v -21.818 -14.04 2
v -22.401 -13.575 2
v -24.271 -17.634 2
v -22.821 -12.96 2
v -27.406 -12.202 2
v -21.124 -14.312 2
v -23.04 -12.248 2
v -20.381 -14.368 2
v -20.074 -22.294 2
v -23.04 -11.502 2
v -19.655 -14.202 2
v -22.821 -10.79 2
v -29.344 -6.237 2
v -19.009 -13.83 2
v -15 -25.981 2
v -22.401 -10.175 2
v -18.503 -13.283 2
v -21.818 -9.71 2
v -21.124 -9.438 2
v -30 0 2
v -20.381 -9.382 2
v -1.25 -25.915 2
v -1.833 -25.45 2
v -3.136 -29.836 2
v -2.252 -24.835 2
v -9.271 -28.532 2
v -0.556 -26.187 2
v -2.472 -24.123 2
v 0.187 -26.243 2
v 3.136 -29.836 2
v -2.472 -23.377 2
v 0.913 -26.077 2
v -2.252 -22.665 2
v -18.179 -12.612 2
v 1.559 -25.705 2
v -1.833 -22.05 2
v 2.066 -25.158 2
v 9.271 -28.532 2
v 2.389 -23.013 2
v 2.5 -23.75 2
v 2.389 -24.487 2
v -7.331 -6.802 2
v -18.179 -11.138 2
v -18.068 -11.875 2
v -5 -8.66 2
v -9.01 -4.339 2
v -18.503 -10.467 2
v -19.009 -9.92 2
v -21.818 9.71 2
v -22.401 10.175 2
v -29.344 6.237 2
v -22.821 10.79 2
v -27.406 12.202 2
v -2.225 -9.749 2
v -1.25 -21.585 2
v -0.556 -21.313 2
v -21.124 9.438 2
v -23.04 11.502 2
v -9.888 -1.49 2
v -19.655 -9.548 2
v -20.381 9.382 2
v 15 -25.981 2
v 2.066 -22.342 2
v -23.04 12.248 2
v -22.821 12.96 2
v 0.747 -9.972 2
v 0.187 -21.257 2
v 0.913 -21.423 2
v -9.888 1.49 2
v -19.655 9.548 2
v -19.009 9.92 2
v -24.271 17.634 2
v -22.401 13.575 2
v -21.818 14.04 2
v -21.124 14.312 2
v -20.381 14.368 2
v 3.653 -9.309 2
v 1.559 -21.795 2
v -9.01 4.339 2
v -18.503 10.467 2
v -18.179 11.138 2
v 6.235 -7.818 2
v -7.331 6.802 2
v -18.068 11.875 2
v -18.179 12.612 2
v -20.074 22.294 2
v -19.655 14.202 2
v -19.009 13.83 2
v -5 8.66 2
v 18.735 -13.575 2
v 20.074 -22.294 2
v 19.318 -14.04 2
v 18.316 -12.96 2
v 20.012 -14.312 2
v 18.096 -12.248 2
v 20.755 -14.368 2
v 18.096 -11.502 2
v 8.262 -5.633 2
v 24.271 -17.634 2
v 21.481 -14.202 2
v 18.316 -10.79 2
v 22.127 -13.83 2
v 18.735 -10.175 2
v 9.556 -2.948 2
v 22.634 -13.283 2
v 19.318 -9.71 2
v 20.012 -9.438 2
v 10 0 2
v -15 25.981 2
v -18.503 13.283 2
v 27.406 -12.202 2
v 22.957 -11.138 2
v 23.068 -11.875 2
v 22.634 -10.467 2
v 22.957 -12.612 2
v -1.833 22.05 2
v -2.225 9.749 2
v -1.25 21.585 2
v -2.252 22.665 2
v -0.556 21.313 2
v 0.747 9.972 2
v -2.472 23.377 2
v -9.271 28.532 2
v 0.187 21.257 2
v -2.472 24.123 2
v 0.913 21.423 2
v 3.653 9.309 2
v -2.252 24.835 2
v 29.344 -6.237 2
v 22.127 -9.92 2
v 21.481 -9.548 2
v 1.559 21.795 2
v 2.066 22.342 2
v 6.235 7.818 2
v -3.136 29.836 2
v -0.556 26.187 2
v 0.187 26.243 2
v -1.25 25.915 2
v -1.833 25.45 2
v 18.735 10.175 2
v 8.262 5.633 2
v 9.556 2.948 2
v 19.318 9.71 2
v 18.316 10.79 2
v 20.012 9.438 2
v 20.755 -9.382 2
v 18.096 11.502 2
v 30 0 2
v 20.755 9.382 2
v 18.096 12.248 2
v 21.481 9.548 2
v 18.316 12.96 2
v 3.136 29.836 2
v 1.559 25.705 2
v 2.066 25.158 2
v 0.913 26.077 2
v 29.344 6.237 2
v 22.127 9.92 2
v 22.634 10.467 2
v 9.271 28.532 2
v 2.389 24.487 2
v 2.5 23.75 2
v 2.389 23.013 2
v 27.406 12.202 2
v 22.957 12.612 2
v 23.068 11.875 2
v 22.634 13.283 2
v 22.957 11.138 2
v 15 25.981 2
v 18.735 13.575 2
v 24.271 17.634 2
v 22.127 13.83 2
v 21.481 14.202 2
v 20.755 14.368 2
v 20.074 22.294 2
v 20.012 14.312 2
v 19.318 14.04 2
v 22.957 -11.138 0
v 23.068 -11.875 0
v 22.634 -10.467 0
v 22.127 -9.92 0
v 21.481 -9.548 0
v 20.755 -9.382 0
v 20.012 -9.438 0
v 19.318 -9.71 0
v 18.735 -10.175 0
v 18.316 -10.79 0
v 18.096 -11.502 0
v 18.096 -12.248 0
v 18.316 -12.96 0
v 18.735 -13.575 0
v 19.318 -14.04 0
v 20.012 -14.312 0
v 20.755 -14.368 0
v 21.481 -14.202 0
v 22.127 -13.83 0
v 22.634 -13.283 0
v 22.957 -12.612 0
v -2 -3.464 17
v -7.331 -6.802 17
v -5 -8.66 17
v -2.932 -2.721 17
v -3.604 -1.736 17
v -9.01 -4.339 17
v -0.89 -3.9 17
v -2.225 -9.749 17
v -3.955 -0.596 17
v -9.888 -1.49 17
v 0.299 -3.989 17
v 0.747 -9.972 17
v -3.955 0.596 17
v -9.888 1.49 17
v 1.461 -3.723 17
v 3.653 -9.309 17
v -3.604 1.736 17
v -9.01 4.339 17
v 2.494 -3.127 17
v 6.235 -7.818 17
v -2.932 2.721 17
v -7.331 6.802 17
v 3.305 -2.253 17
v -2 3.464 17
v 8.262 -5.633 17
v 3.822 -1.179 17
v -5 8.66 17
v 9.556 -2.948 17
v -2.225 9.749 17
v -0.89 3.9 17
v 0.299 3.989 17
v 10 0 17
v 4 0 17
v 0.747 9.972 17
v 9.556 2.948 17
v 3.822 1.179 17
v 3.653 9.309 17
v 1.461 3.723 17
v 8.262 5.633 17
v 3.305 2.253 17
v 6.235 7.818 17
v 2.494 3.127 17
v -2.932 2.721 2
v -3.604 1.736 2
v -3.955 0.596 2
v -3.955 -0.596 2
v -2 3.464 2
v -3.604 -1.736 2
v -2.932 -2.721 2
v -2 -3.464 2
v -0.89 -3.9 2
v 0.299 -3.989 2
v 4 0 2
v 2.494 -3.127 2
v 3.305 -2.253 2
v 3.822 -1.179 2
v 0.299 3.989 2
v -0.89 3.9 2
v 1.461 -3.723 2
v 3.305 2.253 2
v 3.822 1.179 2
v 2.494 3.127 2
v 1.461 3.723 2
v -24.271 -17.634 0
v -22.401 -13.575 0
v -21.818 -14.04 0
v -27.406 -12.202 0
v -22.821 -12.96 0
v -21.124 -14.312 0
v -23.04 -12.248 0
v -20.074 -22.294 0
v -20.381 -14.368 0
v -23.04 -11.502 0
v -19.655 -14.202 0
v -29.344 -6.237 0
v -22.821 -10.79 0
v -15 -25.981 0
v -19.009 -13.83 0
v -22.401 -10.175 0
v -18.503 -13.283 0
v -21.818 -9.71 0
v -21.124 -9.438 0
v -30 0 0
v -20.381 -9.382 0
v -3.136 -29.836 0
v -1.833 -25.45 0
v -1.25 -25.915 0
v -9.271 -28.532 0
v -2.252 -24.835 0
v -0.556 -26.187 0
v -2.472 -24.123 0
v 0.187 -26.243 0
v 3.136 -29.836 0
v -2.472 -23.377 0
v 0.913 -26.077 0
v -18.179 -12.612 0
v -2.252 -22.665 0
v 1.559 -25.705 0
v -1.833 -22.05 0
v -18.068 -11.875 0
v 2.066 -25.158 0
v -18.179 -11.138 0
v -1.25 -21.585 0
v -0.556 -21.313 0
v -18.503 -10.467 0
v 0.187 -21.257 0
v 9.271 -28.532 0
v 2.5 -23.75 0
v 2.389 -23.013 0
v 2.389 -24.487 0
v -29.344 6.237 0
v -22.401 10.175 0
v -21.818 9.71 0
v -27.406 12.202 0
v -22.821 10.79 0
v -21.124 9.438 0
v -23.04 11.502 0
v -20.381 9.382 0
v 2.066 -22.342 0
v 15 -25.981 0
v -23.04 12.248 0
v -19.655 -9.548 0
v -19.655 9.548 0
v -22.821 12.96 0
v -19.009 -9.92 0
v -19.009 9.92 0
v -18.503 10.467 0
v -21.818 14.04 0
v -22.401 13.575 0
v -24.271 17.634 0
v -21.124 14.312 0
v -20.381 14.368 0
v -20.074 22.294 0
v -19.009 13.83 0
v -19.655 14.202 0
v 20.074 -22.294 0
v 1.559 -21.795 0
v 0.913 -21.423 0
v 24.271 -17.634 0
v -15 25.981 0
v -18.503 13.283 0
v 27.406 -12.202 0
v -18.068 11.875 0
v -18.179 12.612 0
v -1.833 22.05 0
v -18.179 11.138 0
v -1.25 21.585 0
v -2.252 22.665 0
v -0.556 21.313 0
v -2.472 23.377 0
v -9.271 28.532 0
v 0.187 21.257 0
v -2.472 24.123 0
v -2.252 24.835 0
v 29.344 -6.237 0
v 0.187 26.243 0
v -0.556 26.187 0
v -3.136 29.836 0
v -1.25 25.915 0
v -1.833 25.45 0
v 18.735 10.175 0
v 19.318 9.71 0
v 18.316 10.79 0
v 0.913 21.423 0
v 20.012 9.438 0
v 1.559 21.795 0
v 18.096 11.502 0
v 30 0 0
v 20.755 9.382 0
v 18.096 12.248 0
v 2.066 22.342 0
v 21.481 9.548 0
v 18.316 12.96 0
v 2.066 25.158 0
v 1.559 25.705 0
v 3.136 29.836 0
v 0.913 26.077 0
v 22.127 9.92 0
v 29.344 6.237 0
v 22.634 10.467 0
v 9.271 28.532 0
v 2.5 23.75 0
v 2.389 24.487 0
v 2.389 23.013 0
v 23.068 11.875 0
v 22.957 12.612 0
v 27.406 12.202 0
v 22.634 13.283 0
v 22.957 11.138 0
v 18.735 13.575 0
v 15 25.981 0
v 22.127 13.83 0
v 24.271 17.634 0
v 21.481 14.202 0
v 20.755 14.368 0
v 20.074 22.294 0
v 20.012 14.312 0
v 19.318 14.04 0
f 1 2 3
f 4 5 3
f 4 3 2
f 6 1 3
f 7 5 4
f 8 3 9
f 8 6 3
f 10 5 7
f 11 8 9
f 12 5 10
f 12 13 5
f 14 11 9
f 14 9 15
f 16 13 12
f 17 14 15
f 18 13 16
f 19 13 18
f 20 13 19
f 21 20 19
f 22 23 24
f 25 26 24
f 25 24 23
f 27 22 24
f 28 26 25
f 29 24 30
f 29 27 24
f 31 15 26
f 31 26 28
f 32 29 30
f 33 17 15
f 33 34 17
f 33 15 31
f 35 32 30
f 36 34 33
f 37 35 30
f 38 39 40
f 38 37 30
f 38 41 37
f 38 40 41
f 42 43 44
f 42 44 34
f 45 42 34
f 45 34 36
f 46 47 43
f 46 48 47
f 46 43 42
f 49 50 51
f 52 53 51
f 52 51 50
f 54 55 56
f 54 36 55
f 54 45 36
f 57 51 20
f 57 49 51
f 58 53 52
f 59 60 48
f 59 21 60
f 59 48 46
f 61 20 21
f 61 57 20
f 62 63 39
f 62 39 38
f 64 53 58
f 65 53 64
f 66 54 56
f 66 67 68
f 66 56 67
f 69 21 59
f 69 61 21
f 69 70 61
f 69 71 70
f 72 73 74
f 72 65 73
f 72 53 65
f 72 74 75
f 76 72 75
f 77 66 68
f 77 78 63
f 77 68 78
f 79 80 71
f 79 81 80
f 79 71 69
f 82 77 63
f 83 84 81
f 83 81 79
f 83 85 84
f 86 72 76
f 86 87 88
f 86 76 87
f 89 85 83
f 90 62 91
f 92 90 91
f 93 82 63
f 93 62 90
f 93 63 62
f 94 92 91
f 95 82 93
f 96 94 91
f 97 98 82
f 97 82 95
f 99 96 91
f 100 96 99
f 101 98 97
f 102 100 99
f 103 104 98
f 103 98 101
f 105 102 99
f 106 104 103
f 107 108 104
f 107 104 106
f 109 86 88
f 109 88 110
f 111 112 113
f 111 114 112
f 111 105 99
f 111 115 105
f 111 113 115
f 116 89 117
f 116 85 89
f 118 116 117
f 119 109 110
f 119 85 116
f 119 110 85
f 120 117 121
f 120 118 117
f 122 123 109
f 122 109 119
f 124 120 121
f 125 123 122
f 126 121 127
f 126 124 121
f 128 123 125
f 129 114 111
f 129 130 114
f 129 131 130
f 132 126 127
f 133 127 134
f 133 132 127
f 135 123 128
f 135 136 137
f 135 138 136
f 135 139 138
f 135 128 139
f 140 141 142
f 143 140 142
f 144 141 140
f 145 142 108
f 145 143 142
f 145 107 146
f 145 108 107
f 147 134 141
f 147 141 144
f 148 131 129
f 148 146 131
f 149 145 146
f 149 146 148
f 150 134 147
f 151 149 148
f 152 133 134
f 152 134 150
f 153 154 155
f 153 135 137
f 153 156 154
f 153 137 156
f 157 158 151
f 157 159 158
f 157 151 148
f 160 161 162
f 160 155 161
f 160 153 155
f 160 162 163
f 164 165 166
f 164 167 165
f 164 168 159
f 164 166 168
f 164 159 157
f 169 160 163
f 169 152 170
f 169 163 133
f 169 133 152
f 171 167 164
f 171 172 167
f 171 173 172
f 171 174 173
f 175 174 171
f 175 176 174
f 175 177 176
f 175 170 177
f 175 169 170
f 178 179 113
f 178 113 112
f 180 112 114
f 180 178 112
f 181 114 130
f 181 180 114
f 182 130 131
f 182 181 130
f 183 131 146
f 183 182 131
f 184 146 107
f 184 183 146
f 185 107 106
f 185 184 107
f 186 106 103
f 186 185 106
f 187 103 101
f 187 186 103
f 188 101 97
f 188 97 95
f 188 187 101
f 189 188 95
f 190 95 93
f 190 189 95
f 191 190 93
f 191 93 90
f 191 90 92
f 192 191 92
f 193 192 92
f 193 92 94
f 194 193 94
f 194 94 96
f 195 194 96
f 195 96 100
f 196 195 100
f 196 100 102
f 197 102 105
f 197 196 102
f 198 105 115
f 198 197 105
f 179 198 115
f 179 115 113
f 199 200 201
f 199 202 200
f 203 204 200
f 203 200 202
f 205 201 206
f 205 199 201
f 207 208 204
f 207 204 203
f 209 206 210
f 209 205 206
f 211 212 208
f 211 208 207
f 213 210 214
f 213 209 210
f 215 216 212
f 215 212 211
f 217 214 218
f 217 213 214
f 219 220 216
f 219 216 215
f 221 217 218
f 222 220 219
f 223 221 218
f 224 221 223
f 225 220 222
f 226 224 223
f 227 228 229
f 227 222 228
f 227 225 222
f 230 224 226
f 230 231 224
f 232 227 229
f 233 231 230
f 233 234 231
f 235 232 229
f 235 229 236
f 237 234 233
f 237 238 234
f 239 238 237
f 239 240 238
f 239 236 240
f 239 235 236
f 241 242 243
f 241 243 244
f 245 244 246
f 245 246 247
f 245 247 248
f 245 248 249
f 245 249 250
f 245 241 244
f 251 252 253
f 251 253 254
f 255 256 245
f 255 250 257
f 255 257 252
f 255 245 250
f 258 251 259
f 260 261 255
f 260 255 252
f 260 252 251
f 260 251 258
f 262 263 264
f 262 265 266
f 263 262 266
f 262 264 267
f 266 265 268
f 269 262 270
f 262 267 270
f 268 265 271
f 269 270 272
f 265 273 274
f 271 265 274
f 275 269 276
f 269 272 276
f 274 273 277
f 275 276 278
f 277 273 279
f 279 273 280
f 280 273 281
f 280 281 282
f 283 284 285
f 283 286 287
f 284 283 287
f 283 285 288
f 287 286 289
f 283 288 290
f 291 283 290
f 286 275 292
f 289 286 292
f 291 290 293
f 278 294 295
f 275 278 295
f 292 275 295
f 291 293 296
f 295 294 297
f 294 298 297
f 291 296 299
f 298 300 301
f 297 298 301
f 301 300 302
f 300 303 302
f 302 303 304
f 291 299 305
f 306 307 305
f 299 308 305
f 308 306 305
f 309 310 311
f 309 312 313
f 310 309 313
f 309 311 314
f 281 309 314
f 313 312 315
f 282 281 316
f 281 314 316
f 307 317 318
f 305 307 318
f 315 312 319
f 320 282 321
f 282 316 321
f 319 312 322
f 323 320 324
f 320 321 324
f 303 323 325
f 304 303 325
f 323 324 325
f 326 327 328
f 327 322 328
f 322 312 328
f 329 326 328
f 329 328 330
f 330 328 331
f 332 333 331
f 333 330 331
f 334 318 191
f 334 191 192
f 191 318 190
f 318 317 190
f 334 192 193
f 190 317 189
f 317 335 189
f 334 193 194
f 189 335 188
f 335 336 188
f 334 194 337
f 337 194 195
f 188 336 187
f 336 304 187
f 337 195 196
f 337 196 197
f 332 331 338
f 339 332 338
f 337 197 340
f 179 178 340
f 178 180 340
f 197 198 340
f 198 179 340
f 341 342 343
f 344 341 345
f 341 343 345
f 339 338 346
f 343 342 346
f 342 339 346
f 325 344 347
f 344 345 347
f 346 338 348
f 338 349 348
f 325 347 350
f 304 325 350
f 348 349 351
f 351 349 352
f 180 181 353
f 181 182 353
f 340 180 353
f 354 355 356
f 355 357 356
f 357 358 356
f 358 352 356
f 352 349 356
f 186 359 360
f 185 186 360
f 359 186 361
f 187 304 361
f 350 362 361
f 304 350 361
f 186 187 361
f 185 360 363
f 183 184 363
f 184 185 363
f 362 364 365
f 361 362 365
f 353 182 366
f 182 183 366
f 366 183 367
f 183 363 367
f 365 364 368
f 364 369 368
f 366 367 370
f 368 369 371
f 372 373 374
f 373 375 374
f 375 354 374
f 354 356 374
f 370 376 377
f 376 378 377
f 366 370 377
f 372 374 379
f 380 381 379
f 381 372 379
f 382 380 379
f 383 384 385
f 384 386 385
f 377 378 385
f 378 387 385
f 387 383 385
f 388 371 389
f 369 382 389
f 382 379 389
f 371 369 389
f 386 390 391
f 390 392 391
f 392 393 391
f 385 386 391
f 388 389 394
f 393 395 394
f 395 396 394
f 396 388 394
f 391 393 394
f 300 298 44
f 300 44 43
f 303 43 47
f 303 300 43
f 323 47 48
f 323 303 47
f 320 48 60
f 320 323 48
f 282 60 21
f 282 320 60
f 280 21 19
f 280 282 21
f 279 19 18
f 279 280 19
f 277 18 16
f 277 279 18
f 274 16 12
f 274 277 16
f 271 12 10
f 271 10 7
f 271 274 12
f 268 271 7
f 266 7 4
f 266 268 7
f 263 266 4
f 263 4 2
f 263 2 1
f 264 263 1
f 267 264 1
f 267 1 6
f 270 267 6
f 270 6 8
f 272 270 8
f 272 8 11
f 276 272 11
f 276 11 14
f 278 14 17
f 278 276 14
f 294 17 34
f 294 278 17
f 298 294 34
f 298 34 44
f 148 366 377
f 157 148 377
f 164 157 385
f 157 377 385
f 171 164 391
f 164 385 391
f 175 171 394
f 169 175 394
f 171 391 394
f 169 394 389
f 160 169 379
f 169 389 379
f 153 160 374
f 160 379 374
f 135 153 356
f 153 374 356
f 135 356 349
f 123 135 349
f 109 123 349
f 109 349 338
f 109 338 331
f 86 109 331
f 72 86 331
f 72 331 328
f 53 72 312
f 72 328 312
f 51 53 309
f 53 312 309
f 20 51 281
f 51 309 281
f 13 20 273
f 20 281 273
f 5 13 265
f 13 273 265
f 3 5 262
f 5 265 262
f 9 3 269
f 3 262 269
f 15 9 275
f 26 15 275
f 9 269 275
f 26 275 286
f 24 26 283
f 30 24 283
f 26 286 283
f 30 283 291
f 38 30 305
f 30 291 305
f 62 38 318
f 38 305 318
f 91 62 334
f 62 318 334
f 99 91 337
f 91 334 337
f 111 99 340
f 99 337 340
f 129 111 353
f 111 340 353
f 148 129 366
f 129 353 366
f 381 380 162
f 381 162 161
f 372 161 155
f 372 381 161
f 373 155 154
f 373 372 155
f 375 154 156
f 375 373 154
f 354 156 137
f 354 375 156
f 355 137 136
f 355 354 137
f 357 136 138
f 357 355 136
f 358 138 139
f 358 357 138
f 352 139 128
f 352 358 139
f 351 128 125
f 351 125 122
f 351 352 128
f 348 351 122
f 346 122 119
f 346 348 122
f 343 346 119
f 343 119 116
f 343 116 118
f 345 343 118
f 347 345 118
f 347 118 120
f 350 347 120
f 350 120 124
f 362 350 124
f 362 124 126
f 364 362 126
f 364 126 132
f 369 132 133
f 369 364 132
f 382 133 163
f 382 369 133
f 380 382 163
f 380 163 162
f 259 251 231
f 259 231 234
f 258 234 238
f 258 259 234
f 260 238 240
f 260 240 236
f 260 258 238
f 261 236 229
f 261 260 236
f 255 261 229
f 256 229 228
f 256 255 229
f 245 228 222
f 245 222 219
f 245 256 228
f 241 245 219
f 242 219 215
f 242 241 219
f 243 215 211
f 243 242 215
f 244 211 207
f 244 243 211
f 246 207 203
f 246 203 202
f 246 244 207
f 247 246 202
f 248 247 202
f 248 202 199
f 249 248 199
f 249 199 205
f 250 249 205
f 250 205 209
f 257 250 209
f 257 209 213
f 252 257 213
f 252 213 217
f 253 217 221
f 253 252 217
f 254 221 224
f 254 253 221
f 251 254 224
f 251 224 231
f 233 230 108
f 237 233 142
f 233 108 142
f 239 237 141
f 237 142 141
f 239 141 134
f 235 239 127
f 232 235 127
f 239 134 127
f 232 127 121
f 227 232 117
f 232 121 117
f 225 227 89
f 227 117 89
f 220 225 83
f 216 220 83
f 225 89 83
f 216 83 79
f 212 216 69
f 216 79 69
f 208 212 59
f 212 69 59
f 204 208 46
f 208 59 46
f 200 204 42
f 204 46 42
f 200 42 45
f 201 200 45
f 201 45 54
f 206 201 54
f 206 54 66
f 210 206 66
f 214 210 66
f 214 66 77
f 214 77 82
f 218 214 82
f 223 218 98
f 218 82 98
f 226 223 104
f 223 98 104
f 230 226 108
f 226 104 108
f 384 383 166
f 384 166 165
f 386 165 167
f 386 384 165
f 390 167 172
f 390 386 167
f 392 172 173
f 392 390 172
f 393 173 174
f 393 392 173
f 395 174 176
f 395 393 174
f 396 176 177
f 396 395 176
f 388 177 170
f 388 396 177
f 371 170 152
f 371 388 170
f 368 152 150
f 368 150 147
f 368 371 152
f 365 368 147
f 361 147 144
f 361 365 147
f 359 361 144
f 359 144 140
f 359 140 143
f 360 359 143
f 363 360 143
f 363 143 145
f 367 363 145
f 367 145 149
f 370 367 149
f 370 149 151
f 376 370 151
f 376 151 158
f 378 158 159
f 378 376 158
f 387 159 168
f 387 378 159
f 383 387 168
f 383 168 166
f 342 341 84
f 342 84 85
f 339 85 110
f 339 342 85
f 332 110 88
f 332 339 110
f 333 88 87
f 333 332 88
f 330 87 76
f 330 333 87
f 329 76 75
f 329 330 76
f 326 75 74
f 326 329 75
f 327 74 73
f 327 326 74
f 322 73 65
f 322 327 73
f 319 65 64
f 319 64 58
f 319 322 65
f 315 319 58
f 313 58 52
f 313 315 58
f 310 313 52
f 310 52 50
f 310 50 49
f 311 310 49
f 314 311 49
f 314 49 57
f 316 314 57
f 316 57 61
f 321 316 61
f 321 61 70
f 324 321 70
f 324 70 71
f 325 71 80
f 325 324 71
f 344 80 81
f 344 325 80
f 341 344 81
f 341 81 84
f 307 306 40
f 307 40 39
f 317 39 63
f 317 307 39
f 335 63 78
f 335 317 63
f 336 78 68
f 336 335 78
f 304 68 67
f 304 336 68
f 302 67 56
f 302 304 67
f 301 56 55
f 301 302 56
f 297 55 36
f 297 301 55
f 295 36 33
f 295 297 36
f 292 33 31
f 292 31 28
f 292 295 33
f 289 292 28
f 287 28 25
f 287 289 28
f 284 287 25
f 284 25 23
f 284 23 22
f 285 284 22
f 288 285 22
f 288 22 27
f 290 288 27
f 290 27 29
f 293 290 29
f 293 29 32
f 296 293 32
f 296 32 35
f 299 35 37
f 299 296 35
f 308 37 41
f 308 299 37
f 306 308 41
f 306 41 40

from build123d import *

# Parameters (mm, degrees)
SKETCH1_R           = 30
SKETCH1_R_2         = 2.5
BOSS_EXTRUDE1_DEPTH = 2
SKETCH2_R           = 10
SKETCH2_R_2         = 4
BOSS_EXTRUDE2_DEPTH = 15


with BuildPart() as part:
    # Sketch1 → Boss-Extrude1 (new body)
    with BuildSketch(Plane.XY):
        Circle(SKETCH1_R)
        with Locations((0, 23.75)):
            Circle(SKETCH1_R_2, mode=Mode.SUBTRACT)
        with Locations((20.56810334, 11.875)):
            Circle(SKETCH1_R_2, mode=Mode.SUBTRACT)
        with Locations((20.56810334, -11.875)):
            Circle(SKETCH1_R_2, mode=Mode.SUBTRACT)
        with Locations((0, -23.75)):
            Circle(SKETCH1_R_2, mode=Mode.SUBTRACT)
        with Locations((-20.56810334, -11.875)):
            Circle(SKETCH1_R_2, mode=Mode.SUBTRACT)
        with Locations((-20.56810334, 11.875)):
            Circle(SKETCH1_R_2, mode=Mode.SUBTRACT)
    extrude(amount=BOSS_EXTRUDE1_DEPTH)

    # Sketch2 → Boss-Extrude2 (add)
    with BuildSketch(Plane.XY.offset(2)):
        Circle(SKETCH2_R)
        Circle(SKETCH2_R_2, mode=Mode.SUBTRACT)
    extrude(amount=BOSS_EXTRUDE2_DEPTH)


solid = part.part
